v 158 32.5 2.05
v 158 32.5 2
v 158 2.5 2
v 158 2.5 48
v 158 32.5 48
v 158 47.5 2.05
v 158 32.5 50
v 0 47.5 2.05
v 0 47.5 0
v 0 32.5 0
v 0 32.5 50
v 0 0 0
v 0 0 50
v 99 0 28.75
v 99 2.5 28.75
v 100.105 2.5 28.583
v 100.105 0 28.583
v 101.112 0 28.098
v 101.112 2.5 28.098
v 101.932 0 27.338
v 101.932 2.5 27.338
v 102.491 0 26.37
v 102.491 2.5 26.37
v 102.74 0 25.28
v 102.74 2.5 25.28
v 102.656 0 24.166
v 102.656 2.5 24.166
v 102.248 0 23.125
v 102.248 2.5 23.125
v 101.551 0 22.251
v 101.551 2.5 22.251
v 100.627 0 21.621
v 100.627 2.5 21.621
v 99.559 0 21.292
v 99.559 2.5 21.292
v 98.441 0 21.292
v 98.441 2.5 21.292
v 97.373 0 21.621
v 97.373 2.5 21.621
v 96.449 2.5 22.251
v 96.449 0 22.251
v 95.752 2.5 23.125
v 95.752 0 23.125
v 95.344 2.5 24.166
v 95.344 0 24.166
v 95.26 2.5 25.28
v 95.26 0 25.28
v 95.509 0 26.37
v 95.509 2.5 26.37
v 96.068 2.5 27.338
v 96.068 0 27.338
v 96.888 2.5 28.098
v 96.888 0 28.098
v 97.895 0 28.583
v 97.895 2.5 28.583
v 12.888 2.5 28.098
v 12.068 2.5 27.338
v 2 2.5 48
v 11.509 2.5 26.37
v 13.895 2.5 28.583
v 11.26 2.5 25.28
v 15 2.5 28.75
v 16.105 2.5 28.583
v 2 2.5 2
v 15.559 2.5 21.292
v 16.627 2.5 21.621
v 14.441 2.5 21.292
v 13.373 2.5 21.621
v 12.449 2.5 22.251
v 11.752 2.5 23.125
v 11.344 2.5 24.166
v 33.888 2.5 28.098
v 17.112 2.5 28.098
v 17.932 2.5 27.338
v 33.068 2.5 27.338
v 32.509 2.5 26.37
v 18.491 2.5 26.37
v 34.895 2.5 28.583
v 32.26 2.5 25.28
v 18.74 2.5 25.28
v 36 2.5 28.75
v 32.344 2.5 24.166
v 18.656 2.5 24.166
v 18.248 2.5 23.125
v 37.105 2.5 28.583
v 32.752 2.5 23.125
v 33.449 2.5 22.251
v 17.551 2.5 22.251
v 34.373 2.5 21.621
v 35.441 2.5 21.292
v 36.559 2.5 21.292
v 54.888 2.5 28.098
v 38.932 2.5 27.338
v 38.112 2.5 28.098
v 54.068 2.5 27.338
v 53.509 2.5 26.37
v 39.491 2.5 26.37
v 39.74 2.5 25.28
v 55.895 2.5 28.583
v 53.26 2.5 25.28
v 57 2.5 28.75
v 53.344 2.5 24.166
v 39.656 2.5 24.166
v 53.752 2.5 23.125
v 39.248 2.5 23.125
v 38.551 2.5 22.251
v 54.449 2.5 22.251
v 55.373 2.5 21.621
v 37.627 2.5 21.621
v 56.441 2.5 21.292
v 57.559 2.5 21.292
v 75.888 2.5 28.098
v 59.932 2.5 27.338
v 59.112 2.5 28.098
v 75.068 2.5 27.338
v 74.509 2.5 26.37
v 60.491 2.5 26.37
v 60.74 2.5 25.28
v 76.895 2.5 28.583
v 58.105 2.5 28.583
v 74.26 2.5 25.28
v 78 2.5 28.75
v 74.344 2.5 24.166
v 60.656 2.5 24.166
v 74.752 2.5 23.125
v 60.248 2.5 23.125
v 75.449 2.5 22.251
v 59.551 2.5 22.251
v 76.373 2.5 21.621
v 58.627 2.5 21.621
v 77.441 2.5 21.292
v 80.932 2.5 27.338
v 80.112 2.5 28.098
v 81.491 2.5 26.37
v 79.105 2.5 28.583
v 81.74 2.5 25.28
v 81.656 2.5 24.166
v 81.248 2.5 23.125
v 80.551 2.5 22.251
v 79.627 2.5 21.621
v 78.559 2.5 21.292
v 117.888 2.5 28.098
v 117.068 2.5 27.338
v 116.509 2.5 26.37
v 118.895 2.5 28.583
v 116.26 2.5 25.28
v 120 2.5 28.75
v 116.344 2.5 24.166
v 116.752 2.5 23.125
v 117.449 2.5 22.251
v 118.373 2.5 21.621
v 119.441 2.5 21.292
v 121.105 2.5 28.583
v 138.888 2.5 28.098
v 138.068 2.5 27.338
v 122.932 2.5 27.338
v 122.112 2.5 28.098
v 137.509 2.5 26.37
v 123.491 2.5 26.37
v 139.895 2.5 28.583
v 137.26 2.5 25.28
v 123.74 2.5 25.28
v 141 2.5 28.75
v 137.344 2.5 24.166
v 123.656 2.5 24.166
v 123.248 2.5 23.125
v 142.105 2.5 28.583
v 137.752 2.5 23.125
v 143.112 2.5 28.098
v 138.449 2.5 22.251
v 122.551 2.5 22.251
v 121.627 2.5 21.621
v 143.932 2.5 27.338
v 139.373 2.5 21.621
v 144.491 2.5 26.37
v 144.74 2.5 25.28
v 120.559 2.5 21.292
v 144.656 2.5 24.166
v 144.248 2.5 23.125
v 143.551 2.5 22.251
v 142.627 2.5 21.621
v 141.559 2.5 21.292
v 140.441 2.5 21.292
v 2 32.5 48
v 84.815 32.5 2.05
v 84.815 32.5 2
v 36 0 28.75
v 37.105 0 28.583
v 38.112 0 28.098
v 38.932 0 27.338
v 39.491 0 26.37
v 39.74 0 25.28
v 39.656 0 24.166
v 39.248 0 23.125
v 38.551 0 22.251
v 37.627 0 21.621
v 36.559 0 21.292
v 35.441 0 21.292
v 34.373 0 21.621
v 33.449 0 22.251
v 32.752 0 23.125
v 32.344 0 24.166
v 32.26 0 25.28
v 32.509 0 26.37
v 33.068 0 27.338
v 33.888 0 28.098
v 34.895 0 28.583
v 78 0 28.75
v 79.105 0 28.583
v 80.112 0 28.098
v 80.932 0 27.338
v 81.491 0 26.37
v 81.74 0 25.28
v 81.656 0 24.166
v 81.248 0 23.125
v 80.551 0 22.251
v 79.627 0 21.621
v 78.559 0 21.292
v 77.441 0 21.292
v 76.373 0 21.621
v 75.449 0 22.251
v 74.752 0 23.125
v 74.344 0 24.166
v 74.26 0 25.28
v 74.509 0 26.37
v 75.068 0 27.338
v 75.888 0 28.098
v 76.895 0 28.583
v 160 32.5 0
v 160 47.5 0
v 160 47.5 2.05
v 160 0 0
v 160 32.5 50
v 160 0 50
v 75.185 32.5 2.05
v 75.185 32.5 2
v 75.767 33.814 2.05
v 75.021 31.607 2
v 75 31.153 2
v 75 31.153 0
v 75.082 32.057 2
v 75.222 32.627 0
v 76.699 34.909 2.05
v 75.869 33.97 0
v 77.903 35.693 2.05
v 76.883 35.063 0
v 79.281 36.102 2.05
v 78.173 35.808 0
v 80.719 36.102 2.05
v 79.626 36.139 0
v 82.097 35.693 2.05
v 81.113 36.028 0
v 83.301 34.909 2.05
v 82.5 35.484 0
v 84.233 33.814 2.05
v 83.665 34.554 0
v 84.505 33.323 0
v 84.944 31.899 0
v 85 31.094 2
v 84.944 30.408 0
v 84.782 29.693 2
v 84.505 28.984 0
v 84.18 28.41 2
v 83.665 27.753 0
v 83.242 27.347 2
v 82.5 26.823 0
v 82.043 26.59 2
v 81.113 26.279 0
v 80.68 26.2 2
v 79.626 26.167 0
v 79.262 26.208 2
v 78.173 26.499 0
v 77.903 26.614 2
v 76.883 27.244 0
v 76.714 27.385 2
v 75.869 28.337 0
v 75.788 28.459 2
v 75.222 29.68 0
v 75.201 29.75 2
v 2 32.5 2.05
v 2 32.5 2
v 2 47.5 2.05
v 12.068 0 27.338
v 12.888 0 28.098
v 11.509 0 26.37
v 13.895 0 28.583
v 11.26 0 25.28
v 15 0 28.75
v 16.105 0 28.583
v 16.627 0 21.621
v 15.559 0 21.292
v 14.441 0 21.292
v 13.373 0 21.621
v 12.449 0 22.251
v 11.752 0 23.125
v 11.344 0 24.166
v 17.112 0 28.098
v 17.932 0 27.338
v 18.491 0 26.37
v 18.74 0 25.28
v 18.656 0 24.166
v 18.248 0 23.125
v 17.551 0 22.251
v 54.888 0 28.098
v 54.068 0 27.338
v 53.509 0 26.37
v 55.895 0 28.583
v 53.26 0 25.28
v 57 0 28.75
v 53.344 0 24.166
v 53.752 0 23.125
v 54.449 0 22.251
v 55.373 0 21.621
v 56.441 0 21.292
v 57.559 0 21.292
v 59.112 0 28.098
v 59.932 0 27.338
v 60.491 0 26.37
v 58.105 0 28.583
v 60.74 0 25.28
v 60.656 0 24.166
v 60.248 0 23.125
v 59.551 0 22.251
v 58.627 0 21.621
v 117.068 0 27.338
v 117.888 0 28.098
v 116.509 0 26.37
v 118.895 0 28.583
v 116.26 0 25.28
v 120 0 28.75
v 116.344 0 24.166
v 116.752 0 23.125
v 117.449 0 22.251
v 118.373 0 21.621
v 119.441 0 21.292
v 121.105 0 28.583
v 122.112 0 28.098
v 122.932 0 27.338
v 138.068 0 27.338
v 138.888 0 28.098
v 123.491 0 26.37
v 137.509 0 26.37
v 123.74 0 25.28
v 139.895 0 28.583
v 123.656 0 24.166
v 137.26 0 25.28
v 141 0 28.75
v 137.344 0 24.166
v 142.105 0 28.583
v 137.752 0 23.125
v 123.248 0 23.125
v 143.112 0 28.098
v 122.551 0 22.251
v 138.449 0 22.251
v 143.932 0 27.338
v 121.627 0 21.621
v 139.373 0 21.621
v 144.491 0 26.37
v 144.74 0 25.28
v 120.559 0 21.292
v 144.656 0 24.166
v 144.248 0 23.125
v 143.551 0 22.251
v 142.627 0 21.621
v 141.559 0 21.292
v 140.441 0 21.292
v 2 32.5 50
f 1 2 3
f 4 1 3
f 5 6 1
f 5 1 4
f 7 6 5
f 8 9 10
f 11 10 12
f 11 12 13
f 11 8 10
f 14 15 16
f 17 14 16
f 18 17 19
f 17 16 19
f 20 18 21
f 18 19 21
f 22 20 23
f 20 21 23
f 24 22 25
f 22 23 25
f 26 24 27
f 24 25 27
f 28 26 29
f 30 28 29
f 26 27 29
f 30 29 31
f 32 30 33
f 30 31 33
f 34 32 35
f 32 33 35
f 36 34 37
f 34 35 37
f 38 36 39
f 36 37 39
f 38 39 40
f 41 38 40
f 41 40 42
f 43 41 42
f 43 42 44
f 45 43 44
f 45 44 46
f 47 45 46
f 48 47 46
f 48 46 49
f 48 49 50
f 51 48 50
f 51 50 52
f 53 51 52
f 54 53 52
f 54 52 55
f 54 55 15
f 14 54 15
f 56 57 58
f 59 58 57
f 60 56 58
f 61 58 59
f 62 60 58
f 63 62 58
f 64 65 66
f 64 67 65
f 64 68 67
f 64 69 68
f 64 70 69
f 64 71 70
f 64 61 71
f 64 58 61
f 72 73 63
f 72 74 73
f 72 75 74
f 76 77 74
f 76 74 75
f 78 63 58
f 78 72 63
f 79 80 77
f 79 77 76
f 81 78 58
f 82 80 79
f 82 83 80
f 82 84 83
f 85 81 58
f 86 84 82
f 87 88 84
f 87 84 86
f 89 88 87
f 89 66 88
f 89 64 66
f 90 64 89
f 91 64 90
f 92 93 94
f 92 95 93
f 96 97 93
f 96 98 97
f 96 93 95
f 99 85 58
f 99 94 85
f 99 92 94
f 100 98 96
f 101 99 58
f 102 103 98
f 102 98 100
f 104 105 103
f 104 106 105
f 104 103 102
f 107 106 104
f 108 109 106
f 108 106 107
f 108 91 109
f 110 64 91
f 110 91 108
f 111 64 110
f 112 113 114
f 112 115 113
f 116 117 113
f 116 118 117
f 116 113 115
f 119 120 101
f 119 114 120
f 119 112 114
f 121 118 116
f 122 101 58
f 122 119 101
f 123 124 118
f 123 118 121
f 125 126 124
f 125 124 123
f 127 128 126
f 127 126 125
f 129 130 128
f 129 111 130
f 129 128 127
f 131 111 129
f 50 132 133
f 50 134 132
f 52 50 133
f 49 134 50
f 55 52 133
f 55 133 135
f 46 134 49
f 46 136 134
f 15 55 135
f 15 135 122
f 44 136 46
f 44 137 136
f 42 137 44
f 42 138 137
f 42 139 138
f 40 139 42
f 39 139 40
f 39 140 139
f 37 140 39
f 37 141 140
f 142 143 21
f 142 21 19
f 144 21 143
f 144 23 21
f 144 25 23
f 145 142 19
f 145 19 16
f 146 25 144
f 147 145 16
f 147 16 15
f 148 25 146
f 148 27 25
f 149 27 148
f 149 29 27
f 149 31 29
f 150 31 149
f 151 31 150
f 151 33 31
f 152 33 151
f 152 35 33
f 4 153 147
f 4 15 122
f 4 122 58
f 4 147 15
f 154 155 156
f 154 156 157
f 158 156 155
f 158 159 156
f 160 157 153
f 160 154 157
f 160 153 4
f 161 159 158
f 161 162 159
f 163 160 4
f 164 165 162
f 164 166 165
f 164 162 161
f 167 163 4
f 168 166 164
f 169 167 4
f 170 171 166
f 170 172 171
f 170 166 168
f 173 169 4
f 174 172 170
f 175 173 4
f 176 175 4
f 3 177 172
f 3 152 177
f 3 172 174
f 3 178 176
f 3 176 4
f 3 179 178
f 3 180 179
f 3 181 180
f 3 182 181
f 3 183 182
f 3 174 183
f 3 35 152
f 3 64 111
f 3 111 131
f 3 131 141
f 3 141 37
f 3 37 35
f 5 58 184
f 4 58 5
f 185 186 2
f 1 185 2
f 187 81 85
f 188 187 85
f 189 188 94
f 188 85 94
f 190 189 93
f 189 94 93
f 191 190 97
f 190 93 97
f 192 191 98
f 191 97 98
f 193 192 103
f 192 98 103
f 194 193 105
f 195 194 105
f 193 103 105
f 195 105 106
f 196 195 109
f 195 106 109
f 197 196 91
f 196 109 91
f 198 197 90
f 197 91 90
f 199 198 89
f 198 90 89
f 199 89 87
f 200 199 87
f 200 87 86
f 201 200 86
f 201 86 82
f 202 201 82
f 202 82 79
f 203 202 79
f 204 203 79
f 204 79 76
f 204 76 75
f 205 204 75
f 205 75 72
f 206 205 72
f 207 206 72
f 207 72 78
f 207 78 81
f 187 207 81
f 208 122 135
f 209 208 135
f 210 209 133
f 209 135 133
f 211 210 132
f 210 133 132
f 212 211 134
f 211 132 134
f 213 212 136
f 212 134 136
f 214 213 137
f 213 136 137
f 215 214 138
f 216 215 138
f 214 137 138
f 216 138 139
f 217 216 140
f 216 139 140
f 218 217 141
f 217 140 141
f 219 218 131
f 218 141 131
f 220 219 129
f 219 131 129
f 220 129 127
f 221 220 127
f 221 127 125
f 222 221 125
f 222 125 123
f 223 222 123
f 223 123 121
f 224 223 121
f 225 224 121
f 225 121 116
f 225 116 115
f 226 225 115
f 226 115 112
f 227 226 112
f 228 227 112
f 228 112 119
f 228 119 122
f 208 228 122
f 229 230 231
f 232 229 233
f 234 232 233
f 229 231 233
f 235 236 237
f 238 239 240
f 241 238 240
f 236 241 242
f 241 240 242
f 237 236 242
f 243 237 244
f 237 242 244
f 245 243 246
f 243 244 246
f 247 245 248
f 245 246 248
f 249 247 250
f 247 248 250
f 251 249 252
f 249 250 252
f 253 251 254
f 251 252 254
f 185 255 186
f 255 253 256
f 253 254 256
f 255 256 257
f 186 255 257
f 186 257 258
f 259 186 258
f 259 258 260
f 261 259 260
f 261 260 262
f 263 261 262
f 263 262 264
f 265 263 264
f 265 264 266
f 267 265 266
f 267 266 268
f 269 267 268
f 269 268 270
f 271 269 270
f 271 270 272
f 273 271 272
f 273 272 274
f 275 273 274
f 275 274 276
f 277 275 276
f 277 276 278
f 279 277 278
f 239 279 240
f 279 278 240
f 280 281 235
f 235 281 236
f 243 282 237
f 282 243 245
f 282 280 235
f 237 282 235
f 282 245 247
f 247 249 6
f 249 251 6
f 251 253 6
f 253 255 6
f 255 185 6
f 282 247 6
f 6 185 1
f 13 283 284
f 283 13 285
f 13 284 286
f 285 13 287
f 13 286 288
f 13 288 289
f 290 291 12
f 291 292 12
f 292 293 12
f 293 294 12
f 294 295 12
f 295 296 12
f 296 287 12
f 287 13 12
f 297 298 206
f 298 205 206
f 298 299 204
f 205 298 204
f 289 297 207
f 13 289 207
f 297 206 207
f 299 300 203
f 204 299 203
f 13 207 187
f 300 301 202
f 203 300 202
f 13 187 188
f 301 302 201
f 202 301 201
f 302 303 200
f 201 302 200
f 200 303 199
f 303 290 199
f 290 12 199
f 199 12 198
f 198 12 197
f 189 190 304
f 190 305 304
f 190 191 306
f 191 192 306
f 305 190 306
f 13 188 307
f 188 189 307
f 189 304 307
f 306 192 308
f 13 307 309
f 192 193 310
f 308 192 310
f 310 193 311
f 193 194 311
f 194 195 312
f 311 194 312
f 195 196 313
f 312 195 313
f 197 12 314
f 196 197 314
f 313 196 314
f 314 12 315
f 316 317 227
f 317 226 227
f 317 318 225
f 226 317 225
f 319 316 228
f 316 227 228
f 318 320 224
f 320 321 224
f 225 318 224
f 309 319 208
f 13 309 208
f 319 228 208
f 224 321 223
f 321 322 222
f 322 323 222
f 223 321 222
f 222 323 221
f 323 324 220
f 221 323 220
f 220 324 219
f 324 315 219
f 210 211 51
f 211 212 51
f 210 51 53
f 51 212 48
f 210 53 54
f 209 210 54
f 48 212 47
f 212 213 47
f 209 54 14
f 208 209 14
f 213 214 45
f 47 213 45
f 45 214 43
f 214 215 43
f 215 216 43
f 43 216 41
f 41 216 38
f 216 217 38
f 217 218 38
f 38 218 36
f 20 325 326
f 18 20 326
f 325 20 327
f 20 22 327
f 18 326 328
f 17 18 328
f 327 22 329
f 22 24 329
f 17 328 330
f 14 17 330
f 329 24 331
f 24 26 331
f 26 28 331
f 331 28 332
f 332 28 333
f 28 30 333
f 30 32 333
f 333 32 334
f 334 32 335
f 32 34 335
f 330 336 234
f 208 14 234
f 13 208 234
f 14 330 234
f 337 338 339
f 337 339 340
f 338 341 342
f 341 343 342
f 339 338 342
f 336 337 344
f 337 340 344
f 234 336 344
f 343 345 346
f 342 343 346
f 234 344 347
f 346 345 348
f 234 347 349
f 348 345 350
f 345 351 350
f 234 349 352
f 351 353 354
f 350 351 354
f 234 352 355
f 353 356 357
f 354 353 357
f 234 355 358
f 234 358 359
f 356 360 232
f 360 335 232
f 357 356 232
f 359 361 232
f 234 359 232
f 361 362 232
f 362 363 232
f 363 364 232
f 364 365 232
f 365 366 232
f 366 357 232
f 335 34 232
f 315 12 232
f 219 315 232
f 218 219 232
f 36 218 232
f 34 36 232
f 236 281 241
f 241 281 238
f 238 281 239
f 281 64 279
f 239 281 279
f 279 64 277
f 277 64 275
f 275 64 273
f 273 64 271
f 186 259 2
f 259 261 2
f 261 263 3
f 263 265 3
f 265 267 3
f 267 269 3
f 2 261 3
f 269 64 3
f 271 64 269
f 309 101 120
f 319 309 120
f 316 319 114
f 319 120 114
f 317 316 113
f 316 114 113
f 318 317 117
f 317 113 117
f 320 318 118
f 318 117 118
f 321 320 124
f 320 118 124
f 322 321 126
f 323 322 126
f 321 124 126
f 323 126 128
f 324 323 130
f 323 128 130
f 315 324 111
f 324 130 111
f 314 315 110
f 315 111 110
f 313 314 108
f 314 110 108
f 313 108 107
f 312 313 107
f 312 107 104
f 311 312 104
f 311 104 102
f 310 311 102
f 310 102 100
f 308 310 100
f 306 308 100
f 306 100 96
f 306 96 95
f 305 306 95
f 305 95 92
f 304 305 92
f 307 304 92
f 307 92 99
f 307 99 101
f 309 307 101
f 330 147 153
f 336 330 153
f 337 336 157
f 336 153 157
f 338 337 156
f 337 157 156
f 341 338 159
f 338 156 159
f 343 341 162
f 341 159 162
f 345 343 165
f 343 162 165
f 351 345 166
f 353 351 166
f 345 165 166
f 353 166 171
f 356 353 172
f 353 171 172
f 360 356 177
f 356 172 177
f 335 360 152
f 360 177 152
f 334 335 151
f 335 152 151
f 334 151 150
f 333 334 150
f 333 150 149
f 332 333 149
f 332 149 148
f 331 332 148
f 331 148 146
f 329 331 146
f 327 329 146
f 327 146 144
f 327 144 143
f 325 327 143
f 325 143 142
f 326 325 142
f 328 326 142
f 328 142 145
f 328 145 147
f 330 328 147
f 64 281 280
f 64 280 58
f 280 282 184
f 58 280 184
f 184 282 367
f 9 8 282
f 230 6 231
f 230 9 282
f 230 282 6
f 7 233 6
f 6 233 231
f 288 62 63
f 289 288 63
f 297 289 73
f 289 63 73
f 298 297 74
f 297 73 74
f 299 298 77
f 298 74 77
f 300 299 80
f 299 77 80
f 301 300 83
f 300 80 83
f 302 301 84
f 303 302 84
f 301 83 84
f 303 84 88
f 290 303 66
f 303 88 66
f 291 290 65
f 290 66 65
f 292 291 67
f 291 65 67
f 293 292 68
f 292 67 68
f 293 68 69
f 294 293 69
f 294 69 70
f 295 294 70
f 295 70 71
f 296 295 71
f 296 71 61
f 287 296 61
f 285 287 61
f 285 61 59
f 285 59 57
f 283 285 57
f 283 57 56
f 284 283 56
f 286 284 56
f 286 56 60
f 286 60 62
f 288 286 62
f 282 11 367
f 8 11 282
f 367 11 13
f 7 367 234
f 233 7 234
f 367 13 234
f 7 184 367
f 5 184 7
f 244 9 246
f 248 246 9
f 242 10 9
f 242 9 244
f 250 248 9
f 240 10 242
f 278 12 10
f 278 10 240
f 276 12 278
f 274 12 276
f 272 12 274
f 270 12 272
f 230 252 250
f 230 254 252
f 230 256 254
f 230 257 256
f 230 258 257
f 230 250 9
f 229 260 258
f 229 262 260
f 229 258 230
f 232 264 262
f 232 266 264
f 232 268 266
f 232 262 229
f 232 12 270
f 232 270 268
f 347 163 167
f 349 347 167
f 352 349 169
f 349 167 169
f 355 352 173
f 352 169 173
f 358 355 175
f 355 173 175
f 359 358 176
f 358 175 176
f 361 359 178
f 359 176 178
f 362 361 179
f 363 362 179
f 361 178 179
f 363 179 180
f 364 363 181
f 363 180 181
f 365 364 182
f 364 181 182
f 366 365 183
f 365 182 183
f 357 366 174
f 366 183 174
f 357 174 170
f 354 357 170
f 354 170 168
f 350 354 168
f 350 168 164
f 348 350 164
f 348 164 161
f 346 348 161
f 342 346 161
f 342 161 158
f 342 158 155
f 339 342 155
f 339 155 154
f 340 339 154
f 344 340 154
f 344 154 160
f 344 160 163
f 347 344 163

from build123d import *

# Parameters (mm, degrees)
SKETCH1_W           = 160
SKETCH1_H           = 50
BOSS_EXTRUDE1_DEPTH = 2.5
SKETCH2_R           = 3.75
CUT_EXTRUDE1_DEPTH  = 168.649187293
SKETCH3_W           = 160
SKETCH3_H           = 50
SKETCH3_W_2         = 156
SKETCH3_H_2         = 46
BOSS_EXTRUDE2_DEPTH = 30
SKETCH5_W           = 160
SKETCH5_H           = 2.049984413
BOSS_EXTRUDE4_DEPTH = 15
BOSS_EXTRUDE5_DEPTH = 2
BOSS_EXTRUDE7_DEPTH = 2
SKETCH9_R           = 5
CUT_EXTRUDE2_DEPTH  = 3


with BuildPart() as part:
    # Sketch1 → Boss-Extrude1 (new body)
    with BuildSketch(Plane(origin=(0, 0, 0), x_dir=(1, 0, 0), z_dir=(0, 1, 0))):
        with Locations((80, -25)):
            Rectangle(SKETCH1_W, SKETCH1_H)
    extrude(amount=BOSS_EXTRUDE1_DEPTH)

    # Sketch2 → Cut-Extrude1 (cut, through all)
    with BuildSketch(Plane(origin=(0, 2.5, 0), x_dir=(1, 0, 0), z_dir=(0, 1, 0))):
        with Locations(Location((15, -25, 0), (0, 0, 270))):
            Circle(SKETCH2_R)
        with Locations(Location((36, -25, 0), (0, 0, 270))):
            Circle(SKETCH2_R)
        with Locations(Location((57, -25, 0), (0, 0, 270))):
            Circle(SKETCH2_R)
        with Locations(Location((78, -25, 0), (0, 0, 270))):
            Circle(SKETCH2_R)
        with Locations(Location((99, -25, 0), (0, 0, 270))):
            Circle(SKETCH2_R)
        with Locations(Location((120, -25, 0), (0, 0, 270))):
            Circle(SKETCH2_R)
        with Locations(Location((141, -25, 0), (0, 0, 270))):
            Circle(SKETCH2_R)
    extrude(amount=-CUT_EXTRUDE1_DEPTH, mode=Mode.SUBTRACT)

    # Sketch3 → Boss-Extrude2 (add)
    with BuildSketch(Plane(origin=(0, 2.5, 0), x_dir=(1, 0, 0), z_dir=(0, 1, 0))):
        with Locations((80, -25)):
            Rectangle(SKETCH3_W, SKETCH3_H)
        with Locations((80, -25)):
            Rectangle(SKETCH3_W_2, SKETCH3_H_2, mode=Mode.SUBTRACT)
    extrude(amount=BOSS_EXTRUDE2_DEPTH)

    # Sketch5 → Boss-Extrude4 (add)
    with BuildSketch(Plane(origin=(0, 32.5, 0), x_dir=(1, 0, 0), z_dir=(0, 1, 0))):
        with Locations((80, -1.024992207)):
            Rectangle(SKETCH5_W, SKETCH5_H)
    extrude(amount=BOSS_EXTRUDE4_DEPTH)

    # Sketch6 → Boss-Extrude5 (add)
    with BuildSketch(Plane(origin=(160, 0, 0), x_dir=(0, 0, -1), z_dir=(1, 0, 0))):
        Polygon((-2.049984413, 32.5), (-50, 32.5), (-2.049984413, 47.5), align=None)
    extrude(amount=-BOSS_EXTRUDE5_DEPTH)

    # Sketch8 → Boss-Extrude7 (add)
    with BuildSketch(Plane.ZY):
        Polygon((2.049984413, 47.5), (2.049984413, 32.5), (50, 32.5), align=None)
    extrude(amount=-BOSS_EXTRUDE7_DEPTH)

    # Sketch9 → Cut-Extrude2 (cut)
    with BuildSketch(Plane(origin=(0, 0, 0), x_dir=(-1, 0, 0), z_dir=(0, 0, -1))):
        with Locations((-80, 31.153444526)):
            Circle(SKETCH9_R)
    extrude(amount=-CUT_EXTRUDE2_DEPTH, mode=Mode.SUBTRACT)


solid = part.part
